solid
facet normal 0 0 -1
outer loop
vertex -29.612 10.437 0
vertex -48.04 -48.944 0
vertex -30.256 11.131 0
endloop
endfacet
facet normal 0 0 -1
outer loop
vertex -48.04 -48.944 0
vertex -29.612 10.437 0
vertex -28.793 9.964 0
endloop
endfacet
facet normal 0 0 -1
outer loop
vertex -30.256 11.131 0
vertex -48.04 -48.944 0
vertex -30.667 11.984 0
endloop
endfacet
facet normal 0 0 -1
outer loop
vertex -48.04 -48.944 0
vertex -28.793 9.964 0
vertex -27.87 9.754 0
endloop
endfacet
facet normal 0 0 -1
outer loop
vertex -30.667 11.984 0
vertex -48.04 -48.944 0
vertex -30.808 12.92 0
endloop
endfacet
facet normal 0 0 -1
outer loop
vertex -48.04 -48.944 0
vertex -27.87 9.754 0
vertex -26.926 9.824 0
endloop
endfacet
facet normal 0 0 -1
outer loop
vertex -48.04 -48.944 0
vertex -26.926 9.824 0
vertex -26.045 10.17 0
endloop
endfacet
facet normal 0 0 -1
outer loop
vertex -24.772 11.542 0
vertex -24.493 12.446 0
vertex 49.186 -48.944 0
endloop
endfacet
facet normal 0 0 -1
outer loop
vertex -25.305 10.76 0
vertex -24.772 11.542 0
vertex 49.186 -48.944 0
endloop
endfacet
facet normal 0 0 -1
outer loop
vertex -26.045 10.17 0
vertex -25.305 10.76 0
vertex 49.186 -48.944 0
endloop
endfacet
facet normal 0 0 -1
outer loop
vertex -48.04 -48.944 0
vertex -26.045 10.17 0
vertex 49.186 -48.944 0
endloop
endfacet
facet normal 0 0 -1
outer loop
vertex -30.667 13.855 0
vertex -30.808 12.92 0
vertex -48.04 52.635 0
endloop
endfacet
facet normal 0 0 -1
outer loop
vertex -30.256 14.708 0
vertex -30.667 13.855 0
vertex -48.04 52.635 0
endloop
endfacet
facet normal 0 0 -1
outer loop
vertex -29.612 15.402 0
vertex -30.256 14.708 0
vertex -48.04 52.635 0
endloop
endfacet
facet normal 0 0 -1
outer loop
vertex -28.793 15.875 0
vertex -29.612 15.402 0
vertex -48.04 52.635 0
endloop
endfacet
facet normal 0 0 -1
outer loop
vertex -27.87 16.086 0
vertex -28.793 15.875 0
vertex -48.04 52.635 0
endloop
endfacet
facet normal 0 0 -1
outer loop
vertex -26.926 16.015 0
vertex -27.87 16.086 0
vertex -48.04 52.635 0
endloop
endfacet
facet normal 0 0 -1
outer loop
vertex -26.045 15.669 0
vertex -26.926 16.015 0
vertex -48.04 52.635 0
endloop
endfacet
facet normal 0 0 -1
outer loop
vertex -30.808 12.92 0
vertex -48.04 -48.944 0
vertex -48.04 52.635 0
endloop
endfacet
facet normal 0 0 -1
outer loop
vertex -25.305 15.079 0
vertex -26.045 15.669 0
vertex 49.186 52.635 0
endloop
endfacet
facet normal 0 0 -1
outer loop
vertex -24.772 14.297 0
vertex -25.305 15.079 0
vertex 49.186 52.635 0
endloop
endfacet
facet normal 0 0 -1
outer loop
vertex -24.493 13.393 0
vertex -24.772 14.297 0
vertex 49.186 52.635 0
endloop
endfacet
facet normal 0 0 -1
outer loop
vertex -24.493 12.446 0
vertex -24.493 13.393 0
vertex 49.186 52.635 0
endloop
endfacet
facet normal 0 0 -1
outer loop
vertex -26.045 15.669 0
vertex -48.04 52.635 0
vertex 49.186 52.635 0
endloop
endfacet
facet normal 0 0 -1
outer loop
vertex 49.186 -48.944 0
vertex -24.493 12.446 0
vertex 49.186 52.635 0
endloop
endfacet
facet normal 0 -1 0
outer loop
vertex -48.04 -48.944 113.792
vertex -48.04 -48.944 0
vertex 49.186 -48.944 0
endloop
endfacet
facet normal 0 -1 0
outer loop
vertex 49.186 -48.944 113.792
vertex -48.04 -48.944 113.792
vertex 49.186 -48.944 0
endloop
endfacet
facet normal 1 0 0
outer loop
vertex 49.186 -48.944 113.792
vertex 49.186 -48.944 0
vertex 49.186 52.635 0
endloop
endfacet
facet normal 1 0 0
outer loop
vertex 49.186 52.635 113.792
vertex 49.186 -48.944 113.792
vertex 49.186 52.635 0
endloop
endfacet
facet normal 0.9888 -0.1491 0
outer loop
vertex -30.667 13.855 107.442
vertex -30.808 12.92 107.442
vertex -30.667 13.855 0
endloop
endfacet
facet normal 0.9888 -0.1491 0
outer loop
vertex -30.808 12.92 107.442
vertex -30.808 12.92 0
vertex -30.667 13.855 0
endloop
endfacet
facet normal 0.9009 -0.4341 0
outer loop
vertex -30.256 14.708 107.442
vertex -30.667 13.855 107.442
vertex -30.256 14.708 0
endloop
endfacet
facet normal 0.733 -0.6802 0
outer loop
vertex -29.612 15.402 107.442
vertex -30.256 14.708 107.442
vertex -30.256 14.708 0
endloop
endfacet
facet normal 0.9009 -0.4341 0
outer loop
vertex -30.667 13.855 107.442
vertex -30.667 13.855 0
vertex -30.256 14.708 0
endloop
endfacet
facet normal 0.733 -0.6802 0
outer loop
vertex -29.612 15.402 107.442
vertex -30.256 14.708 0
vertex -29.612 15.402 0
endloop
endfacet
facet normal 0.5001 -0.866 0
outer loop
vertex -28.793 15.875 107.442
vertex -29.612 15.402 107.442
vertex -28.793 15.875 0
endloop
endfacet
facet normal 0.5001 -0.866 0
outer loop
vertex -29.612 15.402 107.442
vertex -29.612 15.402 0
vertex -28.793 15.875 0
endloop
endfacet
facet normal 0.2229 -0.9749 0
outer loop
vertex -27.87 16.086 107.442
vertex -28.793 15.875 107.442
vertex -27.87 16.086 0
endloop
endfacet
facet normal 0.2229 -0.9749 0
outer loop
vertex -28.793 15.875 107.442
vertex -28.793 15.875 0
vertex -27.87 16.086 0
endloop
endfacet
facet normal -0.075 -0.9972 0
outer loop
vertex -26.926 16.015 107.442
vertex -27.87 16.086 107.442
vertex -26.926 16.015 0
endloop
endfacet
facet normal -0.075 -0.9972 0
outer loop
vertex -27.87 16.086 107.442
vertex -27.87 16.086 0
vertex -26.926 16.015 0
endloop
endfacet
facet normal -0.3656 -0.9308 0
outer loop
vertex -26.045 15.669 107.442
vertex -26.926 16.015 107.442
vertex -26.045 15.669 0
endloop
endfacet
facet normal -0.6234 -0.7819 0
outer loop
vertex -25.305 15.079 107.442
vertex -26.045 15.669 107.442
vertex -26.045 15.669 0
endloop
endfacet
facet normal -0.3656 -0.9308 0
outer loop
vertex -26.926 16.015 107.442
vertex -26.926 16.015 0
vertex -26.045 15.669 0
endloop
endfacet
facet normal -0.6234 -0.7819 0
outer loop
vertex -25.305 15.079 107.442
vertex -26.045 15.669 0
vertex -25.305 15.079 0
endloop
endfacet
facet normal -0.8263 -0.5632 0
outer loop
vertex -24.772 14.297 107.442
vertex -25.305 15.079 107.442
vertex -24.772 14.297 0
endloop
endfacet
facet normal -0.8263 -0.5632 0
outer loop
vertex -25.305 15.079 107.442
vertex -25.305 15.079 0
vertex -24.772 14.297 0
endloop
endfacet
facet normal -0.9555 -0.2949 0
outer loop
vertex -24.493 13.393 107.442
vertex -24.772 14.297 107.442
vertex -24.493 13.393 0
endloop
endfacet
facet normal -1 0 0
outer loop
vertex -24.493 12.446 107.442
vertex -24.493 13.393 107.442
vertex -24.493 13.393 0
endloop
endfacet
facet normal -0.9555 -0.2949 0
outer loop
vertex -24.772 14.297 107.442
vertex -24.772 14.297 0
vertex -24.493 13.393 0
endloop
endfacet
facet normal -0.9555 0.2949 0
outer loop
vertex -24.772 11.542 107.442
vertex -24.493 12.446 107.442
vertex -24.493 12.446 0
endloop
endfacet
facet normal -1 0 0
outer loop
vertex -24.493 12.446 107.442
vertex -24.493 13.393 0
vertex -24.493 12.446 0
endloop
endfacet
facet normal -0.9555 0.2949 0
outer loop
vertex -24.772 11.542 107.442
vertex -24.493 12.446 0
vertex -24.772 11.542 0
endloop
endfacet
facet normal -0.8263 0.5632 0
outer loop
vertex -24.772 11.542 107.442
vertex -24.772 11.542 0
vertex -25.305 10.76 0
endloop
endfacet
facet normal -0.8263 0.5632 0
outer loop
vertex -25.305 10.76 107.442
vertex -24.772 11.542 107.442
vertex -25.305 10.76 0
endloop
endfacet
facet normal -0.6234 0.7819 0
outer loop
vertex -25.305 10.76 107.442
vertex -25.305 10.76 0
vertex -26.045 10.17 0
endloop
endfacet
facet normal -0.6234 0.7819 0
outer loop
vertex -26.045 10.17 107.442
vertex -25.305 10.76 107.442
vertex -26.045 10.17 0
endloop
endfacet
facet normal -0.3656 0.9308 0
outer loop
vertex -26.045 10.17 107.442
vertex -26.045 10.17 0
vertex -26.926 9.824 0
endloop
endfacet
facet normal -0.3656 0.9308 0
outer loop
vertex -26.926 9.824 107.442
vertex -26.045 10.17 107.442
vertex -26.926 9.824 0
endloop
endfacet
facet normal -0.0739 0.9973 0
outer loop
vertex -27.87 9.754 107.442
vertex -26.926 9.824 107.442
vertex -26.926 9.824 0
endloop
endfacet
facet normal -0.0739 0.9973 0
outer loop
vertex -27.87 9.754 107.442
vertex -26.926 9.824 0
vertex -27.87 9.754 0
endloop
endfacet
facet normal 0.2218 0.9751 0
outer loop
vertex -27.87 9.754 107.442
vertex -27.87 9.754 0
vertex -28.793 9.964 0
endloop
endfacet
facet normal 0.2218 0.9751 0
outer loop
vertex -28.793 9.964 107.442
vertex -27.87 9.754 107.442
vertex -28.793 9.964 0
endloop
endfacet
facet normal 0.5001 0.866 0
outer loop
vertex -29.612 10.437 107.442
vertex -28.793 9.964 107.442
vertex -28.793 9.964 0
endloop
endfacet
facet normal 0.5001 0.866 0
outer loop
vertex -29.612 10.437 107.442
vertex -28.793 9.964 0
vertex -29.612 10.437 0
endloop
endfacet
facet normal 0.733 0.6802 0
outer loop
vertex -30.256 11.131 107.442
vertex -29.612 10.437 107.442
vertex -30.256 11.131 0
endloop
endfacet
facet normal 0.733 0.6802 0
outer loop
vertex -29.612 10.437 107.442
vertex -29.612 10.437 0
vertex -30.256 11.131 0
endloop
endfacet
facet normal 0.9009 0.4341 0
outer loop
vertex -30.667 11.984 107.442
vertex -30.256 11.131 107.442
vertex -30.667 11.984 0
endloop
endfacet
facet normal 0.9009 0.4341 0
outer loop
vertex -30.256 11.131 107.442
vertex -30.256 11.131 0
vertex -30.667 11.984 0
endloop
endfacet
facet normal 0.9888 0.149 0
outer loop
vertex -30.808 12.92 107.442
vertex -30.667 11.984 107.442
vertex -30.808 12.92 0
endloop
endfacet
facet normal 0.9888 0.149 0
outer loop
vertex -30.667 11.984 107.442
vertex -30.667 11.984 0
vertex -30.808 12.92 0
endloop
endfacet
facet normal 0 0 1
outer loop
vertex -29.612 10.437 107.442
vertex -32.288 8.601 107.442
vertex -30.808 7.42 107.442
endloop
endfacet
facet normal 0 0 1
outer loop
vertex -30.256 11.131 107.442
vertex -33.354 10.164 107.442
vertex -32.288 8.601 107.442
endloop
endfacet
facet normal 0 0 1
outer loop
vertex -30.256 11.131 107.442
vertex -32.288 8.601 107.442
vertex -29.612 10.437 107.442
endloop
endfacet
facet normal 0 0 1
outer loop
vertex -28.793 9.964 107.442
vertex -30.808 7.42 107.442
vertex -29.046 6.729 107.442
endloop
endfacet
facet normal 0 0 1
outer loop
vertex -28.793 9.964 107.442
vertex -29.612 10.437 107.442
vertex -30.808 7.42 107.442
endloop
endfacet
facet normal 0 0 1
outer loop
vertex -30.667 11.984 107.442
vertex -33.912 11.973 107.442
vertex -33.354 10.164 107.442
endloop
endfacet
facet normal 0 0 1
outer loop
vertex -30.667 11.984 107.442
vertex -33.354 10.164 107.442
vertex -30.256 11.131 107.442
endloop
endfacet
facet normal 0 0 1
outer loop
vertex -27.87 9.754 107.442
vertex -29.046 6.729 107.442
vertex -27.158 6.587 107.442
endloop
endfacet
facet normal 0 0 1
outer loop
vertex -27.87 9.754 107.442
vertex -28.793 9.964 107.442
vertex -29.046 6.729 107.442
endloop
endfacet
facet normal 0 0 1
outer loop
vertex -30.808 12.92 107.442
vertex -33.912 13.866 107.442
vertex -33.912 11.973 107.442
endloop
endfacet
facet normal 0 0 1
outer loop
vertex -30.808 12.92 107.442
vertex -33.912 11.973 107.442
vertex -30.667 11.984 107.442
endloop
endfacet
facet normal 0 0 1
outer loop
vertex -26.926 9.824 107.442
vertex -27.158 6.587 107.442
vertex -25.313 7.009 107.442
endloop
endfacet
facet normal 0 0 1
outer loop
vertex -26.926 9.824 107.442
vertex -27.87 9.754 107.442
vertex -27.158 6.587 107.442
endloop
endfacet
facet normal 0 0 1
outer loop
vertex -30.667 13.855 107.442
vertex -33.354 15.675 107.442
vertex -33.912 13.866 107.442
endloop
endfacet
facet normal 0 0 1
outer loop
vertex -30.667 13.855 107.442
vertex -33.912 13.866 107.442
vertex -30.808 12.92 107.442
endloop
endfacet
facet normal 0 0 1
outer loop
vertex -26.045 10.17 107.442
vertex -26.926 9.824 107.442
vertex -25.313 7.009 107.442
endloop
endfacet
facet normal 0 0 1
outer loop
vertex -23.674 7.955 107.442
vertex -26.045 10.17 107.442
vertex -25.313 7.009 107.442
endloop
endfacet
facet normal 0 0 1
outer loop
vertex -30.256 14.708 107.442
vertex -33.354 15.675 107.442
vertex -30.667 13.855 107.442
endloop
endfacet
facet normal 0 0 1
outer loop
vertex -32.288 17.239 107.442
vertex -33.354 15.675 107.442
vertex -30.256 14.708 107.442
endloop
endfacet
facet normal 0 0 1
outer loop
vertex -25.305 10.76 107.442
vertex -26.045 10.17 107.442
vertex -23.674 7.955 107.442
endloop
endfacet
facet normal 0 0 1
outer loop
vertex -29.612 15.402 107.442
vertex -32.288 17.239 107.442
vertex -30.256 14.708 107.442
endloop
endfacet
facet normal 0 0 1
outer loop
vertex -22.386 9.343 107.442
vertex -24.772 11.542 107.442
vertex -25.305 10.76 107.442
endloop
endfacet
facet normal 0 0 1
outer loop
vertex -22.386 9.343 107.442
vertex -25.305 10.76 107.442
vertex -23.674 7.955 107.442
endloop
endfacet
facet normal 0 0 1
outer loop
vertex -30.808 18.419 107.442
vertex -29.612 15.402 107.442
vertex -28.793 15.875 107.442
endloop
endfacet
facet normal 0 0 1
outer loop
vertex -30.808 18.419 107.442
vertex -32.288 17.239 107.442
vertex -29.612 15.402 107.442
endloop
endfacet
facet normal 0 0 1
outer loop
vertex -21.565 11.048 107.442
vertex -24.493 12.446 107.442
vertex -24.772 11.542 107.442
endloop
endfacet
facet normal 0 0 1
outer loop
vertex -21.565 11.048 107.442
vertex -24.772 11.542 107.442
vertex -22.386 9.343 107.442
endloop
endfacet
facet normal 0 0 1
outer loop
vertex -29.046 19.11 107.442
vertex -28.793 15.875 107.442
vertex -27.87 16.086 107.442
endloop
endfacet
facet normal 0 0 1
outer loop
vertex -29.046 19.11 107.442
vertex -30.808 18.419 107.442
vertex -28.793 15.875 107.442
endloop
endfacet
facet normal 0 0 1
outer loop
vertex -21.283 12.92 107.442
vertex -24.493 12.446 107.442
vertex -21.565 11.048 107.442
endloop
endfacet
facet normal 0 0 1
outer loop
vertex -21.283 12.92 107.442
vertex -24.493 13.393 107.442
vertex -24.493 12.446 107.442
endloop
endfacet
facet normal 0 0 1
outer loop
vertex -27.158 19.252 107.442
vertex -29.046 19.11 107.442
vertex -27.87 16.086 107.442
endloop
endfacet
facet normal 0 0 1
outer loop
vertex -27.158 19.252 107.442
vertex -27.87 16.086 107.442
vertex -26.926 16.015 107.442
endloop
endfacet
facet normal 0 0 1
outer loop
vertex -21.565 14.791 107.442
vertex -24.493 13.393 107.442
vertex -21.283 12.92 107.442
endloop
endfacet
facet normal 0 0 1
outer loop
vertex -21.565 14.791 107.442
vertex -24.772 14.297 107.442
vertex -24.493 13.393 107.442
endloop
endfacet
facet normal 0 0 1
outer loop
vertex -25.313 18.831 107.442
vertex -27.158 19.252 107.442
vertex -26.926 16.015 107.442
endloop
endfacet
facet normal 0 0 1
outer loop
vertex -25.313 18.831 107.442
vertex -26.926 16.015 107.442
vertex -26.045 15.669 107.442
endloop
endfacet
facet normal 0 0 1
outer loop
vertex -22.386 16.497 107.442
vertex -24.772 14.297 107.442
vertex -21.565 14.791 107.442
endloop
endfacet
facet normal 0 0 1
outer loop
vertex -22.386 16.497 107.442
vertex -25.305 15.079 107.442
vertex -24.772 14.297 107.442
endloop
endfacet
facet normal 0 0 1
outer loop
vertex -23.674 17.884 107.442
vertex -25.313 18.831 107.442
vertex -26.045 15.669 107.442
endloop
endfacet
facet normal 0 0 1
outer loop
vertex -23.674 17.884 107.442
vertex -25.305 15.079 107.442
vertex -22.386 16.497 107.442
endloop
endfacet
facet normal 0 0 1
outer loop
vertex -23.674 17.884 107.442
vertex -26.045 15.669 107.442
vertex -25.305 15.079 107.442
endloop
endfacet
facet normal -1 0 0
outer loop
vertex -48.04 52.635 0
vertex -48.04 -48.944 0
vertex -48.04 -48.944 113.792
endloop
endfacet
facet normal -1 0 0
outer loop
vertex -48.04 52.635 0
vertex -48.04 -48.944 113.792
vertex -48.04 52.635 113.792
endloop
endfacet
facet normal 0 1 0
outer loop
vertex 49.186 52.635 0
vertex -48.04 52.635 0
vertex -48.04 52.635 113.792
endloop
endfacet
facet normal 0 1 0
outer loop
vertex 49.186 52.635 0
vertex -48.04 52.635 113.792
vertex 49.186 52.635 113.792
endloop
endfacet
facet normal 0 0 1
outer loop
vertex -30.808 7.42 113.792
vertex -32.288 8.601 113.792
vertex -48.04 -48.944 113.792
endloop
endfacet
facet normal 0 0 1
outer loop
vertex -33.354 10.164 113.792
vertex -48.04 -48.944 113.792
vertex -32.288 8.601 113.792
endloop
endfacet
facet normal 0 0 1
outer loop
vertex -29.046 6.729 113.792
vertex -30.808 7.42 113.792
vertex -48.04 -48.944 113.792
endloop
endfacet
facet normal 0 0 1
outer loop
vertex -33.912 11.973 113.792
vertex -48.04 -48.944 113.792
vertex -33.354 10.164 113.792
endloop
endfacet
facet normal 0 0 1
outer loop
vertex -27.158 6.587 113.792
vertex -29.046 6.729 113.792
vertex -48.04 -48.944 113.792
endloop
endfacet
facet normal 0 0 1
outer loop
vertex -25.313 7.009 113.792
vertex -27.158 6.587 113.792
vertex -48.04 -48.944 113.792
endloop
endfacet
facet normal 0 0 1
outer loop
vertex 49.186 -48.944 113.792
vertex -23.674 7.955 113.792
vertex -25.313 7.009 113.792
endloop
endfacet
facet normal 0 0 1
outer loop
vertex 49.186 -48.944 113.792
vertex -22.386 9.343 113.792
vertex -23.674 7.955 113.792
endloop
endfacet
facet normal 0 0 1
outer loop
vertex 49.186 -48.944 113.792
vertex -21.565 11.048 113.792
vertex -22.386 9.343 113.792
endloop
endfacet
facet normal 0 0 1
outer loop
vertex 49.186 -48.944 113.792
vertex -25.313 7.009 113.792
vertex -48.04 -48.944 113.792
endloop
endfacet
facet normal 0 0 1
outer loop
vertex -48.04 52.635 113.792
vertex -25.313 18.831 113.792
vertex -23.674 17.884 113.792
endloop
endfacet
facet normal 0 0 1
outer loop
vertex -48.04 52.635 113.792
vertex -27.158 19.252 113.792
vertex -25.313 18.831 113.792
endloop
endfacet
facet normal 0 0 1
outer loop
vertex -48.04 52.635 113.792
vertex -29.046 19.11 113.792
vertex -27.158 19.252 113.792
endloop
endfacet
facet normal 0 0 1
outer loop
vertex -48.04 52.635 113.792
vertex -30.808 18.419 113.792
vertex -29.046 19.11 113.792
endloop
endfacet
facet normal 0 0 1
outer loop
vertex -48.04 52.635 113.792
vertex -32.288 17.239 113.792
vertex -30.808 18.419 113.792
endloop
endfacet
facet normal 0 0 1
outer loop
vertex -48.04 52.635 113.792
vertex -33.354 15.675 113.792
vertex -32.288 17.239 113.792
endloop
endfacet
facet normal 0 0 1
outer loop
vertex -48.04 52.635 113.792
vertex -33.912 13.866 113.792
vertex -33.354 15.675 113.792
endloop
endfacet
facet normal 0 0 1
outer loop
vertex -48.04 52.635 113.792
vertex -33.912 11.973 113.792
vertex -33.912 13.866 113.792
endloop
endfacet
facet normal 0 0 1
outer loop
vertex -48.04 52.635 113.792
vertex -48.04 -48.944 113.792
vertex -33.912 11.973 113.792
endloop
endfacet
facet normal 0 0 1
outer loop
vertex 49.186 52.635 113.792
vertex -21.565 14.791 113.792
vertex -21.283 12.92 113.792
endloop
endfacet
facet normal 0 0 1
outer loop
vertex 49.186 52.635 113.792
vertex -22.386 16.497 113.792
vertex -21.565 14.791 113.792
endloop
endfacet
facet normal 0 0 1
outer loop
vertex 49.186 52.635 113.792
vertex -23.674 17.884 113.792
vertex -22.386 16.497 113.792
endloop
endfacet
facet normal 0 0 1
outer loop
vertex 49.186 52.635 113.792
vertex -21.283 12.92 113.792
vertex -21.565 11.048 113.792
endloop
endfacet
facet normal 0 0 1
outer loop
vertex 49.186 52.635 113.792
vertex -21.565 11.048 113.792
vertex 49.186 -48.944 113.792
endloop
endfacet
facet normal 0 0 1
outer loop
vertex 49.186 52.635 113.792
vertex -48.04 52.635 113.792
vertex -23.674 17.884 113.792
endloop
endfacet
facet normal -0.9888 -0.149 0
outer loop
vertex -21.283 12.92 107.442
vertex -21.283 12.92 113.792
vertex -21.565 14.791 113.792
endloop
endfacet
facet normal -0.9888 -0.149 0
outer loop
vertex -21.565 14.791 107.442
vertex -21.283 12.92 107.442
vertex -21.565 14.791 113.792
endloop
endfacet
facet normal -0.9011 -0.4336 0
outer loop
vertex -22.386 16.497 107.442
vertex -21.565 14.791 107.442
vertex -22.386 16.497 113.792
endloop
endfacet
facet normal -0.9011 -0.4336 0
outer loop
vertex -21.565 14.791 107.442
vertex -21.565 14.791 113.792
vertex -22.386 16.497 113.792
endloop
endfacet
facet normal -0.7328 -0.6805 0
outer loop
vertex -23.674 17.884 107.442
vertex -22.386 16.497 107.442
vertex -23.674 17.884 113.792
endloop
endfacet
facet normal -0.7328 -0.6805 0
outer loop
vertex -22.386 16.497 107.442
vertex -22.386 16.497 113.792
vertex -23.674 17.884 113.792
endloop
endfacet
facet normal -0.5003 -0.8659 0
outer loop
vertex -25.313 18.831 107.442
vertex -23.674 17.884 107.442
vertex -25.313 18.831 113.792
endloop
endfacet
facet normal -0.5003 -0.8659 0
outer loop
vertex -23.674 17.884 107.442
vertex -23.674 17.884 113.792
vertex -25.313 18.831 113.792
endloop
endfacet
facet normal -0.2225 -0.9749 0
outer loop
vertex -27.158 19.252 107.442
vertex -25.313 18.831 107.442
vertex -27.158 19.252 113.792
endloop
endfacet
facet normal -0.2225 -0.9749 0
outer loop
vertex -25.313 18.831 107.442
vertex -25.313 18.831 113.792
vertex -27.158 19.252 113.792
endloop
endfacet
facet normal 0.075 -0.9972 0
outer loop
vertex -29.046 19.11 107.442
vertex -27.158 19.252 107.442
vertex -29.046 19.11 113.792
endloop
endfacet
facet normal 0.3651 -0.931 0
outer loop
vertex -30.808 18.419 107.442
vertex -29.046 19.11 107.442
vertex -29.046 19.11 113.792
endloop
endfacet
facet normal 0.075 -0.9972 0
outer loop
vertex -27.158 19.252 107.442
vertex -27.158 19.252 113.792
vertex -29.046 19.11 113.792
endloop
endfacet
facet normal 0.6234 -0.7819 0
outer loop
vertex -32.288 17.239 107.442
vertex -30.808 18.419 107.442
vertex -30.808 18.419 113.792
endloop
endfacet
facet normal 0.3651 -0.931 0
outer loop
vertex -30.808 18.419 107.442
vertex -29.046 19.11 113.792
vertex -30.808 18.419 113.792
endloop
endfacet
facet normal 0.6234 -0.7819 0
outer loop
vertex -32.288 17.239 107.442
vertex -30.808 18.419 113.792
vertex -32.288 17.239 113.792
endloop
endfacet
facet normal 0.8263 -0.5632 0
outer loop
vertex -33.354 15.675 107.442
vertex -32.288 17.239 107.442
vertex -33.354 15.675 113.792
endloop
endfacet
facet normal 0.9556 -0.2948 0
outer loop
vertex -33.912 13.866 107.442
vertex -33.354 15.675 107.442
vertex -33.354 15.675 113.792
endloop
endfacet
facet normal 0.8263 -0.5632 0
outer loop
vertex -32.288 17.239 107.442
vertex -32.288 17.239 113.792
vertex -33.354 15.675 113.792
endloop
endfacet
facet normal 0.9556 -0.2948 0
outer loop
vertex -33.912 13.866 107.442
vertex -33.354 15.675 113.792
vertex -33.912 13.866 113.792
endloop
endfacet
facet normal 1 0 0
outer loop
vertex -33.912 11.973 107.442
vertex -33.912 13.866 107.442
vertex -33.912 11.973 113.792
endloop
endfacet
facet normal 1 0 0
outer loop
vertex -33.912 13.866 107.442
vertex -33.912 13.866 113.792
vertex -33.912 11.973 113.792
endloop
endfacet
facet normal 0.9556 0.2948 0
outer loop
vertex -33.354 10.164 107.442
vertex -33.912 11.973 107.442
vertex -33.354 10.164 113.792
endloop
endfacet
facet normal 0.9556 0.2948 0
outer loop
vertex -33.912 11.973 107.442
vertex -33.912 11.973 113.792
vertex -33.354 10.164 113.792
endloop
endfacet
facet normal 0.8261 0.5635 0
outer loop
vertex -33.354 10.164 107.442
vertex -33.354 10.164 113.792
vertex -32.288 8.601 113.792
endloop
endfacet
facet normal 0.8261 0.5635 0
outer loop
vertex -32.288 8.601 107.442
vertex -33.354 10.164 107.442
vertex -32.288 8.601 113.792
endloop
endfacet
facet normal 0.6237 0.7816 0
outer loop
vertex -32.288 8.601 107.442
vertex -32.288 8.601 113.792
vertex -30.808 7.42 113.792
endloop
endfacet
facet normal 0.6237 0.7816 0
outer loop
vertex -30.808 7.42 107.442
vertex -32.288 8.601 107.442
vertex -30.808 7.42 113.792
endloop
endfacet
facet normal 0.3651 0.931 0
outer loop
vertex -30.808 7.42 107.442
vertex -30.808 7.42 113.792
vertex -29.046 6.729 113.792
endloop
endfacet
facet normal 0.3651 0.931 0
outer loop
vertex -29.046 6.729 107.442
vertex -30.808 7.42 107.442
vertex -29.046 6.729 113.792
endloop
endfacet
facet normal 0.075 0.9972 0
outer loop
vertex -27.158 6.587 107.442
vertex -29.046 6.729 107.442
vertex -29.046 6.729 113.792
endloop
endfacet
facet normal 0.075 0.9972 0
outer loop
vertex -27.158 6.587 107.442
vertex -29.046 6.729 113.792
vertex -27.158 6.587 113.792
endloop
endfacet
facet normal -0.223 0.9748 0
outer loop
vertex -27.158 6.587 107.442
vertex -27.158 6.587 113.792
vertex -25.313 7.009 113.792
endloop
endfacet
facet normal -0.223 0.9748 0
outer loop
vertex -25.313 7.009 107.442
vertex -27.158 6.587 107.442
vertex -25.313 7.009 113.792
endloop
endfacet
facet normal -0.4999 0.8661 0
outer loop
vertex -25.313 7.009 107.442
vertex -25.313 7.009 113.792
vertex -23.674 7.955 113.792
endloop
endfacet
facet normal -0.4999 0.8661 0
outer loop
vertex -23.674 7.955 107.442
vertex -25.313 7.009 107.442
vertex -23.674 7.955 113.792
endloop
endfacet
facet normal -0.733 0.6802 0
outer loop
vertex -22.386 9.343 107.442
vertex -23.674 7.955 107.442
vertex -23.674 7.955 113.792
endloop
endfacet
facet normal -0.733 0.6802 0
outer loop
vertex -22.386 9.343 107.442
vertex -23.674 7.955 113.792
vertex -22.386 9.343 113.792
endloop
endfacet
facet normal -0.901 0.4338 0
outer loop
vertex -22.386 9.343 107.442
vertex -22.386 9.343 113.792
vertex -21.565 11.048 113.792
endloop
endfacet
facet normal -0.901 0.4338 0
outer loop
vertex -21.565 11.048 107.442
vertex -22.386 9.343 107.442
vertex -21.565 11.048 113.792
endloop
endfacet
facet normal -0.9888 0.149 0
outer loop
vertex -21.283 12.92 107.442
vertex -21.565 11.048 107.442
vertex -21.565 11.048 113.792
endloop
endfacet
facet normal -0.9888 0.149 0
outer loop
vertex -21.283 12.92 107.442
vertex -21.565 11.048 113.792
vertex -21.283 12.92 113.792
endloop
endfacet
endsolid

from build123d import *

# Parameters (mm, degrees)
F0_W           = 97.225771
F0_H           = 101.578414
F1_DEPTH       = 113.792
F3_D           = 6.35
F3_CBORE_D     = 12.7
F3_CBORE_DEPTH = 6.35


with BuildPart() as f1:
    # F0 (on Top) → F1 (new body)
    with BuildSketch(Plane.XY):
        with Locations((0.573047, 1.845401)):
            Rectangle(F0_W, F0_H)
    extrude(amount=F1_DEPTH)

    # F3 (through all)
    with Locations(Plane.XY.offset(113.792)):
        with Locations((-27.632849, 12.919624)):
            CounterBoreHole(F3_D / 2, F3_CBORE_D / 2, F3_CBORE_DEPTH)


solid = f1.part
